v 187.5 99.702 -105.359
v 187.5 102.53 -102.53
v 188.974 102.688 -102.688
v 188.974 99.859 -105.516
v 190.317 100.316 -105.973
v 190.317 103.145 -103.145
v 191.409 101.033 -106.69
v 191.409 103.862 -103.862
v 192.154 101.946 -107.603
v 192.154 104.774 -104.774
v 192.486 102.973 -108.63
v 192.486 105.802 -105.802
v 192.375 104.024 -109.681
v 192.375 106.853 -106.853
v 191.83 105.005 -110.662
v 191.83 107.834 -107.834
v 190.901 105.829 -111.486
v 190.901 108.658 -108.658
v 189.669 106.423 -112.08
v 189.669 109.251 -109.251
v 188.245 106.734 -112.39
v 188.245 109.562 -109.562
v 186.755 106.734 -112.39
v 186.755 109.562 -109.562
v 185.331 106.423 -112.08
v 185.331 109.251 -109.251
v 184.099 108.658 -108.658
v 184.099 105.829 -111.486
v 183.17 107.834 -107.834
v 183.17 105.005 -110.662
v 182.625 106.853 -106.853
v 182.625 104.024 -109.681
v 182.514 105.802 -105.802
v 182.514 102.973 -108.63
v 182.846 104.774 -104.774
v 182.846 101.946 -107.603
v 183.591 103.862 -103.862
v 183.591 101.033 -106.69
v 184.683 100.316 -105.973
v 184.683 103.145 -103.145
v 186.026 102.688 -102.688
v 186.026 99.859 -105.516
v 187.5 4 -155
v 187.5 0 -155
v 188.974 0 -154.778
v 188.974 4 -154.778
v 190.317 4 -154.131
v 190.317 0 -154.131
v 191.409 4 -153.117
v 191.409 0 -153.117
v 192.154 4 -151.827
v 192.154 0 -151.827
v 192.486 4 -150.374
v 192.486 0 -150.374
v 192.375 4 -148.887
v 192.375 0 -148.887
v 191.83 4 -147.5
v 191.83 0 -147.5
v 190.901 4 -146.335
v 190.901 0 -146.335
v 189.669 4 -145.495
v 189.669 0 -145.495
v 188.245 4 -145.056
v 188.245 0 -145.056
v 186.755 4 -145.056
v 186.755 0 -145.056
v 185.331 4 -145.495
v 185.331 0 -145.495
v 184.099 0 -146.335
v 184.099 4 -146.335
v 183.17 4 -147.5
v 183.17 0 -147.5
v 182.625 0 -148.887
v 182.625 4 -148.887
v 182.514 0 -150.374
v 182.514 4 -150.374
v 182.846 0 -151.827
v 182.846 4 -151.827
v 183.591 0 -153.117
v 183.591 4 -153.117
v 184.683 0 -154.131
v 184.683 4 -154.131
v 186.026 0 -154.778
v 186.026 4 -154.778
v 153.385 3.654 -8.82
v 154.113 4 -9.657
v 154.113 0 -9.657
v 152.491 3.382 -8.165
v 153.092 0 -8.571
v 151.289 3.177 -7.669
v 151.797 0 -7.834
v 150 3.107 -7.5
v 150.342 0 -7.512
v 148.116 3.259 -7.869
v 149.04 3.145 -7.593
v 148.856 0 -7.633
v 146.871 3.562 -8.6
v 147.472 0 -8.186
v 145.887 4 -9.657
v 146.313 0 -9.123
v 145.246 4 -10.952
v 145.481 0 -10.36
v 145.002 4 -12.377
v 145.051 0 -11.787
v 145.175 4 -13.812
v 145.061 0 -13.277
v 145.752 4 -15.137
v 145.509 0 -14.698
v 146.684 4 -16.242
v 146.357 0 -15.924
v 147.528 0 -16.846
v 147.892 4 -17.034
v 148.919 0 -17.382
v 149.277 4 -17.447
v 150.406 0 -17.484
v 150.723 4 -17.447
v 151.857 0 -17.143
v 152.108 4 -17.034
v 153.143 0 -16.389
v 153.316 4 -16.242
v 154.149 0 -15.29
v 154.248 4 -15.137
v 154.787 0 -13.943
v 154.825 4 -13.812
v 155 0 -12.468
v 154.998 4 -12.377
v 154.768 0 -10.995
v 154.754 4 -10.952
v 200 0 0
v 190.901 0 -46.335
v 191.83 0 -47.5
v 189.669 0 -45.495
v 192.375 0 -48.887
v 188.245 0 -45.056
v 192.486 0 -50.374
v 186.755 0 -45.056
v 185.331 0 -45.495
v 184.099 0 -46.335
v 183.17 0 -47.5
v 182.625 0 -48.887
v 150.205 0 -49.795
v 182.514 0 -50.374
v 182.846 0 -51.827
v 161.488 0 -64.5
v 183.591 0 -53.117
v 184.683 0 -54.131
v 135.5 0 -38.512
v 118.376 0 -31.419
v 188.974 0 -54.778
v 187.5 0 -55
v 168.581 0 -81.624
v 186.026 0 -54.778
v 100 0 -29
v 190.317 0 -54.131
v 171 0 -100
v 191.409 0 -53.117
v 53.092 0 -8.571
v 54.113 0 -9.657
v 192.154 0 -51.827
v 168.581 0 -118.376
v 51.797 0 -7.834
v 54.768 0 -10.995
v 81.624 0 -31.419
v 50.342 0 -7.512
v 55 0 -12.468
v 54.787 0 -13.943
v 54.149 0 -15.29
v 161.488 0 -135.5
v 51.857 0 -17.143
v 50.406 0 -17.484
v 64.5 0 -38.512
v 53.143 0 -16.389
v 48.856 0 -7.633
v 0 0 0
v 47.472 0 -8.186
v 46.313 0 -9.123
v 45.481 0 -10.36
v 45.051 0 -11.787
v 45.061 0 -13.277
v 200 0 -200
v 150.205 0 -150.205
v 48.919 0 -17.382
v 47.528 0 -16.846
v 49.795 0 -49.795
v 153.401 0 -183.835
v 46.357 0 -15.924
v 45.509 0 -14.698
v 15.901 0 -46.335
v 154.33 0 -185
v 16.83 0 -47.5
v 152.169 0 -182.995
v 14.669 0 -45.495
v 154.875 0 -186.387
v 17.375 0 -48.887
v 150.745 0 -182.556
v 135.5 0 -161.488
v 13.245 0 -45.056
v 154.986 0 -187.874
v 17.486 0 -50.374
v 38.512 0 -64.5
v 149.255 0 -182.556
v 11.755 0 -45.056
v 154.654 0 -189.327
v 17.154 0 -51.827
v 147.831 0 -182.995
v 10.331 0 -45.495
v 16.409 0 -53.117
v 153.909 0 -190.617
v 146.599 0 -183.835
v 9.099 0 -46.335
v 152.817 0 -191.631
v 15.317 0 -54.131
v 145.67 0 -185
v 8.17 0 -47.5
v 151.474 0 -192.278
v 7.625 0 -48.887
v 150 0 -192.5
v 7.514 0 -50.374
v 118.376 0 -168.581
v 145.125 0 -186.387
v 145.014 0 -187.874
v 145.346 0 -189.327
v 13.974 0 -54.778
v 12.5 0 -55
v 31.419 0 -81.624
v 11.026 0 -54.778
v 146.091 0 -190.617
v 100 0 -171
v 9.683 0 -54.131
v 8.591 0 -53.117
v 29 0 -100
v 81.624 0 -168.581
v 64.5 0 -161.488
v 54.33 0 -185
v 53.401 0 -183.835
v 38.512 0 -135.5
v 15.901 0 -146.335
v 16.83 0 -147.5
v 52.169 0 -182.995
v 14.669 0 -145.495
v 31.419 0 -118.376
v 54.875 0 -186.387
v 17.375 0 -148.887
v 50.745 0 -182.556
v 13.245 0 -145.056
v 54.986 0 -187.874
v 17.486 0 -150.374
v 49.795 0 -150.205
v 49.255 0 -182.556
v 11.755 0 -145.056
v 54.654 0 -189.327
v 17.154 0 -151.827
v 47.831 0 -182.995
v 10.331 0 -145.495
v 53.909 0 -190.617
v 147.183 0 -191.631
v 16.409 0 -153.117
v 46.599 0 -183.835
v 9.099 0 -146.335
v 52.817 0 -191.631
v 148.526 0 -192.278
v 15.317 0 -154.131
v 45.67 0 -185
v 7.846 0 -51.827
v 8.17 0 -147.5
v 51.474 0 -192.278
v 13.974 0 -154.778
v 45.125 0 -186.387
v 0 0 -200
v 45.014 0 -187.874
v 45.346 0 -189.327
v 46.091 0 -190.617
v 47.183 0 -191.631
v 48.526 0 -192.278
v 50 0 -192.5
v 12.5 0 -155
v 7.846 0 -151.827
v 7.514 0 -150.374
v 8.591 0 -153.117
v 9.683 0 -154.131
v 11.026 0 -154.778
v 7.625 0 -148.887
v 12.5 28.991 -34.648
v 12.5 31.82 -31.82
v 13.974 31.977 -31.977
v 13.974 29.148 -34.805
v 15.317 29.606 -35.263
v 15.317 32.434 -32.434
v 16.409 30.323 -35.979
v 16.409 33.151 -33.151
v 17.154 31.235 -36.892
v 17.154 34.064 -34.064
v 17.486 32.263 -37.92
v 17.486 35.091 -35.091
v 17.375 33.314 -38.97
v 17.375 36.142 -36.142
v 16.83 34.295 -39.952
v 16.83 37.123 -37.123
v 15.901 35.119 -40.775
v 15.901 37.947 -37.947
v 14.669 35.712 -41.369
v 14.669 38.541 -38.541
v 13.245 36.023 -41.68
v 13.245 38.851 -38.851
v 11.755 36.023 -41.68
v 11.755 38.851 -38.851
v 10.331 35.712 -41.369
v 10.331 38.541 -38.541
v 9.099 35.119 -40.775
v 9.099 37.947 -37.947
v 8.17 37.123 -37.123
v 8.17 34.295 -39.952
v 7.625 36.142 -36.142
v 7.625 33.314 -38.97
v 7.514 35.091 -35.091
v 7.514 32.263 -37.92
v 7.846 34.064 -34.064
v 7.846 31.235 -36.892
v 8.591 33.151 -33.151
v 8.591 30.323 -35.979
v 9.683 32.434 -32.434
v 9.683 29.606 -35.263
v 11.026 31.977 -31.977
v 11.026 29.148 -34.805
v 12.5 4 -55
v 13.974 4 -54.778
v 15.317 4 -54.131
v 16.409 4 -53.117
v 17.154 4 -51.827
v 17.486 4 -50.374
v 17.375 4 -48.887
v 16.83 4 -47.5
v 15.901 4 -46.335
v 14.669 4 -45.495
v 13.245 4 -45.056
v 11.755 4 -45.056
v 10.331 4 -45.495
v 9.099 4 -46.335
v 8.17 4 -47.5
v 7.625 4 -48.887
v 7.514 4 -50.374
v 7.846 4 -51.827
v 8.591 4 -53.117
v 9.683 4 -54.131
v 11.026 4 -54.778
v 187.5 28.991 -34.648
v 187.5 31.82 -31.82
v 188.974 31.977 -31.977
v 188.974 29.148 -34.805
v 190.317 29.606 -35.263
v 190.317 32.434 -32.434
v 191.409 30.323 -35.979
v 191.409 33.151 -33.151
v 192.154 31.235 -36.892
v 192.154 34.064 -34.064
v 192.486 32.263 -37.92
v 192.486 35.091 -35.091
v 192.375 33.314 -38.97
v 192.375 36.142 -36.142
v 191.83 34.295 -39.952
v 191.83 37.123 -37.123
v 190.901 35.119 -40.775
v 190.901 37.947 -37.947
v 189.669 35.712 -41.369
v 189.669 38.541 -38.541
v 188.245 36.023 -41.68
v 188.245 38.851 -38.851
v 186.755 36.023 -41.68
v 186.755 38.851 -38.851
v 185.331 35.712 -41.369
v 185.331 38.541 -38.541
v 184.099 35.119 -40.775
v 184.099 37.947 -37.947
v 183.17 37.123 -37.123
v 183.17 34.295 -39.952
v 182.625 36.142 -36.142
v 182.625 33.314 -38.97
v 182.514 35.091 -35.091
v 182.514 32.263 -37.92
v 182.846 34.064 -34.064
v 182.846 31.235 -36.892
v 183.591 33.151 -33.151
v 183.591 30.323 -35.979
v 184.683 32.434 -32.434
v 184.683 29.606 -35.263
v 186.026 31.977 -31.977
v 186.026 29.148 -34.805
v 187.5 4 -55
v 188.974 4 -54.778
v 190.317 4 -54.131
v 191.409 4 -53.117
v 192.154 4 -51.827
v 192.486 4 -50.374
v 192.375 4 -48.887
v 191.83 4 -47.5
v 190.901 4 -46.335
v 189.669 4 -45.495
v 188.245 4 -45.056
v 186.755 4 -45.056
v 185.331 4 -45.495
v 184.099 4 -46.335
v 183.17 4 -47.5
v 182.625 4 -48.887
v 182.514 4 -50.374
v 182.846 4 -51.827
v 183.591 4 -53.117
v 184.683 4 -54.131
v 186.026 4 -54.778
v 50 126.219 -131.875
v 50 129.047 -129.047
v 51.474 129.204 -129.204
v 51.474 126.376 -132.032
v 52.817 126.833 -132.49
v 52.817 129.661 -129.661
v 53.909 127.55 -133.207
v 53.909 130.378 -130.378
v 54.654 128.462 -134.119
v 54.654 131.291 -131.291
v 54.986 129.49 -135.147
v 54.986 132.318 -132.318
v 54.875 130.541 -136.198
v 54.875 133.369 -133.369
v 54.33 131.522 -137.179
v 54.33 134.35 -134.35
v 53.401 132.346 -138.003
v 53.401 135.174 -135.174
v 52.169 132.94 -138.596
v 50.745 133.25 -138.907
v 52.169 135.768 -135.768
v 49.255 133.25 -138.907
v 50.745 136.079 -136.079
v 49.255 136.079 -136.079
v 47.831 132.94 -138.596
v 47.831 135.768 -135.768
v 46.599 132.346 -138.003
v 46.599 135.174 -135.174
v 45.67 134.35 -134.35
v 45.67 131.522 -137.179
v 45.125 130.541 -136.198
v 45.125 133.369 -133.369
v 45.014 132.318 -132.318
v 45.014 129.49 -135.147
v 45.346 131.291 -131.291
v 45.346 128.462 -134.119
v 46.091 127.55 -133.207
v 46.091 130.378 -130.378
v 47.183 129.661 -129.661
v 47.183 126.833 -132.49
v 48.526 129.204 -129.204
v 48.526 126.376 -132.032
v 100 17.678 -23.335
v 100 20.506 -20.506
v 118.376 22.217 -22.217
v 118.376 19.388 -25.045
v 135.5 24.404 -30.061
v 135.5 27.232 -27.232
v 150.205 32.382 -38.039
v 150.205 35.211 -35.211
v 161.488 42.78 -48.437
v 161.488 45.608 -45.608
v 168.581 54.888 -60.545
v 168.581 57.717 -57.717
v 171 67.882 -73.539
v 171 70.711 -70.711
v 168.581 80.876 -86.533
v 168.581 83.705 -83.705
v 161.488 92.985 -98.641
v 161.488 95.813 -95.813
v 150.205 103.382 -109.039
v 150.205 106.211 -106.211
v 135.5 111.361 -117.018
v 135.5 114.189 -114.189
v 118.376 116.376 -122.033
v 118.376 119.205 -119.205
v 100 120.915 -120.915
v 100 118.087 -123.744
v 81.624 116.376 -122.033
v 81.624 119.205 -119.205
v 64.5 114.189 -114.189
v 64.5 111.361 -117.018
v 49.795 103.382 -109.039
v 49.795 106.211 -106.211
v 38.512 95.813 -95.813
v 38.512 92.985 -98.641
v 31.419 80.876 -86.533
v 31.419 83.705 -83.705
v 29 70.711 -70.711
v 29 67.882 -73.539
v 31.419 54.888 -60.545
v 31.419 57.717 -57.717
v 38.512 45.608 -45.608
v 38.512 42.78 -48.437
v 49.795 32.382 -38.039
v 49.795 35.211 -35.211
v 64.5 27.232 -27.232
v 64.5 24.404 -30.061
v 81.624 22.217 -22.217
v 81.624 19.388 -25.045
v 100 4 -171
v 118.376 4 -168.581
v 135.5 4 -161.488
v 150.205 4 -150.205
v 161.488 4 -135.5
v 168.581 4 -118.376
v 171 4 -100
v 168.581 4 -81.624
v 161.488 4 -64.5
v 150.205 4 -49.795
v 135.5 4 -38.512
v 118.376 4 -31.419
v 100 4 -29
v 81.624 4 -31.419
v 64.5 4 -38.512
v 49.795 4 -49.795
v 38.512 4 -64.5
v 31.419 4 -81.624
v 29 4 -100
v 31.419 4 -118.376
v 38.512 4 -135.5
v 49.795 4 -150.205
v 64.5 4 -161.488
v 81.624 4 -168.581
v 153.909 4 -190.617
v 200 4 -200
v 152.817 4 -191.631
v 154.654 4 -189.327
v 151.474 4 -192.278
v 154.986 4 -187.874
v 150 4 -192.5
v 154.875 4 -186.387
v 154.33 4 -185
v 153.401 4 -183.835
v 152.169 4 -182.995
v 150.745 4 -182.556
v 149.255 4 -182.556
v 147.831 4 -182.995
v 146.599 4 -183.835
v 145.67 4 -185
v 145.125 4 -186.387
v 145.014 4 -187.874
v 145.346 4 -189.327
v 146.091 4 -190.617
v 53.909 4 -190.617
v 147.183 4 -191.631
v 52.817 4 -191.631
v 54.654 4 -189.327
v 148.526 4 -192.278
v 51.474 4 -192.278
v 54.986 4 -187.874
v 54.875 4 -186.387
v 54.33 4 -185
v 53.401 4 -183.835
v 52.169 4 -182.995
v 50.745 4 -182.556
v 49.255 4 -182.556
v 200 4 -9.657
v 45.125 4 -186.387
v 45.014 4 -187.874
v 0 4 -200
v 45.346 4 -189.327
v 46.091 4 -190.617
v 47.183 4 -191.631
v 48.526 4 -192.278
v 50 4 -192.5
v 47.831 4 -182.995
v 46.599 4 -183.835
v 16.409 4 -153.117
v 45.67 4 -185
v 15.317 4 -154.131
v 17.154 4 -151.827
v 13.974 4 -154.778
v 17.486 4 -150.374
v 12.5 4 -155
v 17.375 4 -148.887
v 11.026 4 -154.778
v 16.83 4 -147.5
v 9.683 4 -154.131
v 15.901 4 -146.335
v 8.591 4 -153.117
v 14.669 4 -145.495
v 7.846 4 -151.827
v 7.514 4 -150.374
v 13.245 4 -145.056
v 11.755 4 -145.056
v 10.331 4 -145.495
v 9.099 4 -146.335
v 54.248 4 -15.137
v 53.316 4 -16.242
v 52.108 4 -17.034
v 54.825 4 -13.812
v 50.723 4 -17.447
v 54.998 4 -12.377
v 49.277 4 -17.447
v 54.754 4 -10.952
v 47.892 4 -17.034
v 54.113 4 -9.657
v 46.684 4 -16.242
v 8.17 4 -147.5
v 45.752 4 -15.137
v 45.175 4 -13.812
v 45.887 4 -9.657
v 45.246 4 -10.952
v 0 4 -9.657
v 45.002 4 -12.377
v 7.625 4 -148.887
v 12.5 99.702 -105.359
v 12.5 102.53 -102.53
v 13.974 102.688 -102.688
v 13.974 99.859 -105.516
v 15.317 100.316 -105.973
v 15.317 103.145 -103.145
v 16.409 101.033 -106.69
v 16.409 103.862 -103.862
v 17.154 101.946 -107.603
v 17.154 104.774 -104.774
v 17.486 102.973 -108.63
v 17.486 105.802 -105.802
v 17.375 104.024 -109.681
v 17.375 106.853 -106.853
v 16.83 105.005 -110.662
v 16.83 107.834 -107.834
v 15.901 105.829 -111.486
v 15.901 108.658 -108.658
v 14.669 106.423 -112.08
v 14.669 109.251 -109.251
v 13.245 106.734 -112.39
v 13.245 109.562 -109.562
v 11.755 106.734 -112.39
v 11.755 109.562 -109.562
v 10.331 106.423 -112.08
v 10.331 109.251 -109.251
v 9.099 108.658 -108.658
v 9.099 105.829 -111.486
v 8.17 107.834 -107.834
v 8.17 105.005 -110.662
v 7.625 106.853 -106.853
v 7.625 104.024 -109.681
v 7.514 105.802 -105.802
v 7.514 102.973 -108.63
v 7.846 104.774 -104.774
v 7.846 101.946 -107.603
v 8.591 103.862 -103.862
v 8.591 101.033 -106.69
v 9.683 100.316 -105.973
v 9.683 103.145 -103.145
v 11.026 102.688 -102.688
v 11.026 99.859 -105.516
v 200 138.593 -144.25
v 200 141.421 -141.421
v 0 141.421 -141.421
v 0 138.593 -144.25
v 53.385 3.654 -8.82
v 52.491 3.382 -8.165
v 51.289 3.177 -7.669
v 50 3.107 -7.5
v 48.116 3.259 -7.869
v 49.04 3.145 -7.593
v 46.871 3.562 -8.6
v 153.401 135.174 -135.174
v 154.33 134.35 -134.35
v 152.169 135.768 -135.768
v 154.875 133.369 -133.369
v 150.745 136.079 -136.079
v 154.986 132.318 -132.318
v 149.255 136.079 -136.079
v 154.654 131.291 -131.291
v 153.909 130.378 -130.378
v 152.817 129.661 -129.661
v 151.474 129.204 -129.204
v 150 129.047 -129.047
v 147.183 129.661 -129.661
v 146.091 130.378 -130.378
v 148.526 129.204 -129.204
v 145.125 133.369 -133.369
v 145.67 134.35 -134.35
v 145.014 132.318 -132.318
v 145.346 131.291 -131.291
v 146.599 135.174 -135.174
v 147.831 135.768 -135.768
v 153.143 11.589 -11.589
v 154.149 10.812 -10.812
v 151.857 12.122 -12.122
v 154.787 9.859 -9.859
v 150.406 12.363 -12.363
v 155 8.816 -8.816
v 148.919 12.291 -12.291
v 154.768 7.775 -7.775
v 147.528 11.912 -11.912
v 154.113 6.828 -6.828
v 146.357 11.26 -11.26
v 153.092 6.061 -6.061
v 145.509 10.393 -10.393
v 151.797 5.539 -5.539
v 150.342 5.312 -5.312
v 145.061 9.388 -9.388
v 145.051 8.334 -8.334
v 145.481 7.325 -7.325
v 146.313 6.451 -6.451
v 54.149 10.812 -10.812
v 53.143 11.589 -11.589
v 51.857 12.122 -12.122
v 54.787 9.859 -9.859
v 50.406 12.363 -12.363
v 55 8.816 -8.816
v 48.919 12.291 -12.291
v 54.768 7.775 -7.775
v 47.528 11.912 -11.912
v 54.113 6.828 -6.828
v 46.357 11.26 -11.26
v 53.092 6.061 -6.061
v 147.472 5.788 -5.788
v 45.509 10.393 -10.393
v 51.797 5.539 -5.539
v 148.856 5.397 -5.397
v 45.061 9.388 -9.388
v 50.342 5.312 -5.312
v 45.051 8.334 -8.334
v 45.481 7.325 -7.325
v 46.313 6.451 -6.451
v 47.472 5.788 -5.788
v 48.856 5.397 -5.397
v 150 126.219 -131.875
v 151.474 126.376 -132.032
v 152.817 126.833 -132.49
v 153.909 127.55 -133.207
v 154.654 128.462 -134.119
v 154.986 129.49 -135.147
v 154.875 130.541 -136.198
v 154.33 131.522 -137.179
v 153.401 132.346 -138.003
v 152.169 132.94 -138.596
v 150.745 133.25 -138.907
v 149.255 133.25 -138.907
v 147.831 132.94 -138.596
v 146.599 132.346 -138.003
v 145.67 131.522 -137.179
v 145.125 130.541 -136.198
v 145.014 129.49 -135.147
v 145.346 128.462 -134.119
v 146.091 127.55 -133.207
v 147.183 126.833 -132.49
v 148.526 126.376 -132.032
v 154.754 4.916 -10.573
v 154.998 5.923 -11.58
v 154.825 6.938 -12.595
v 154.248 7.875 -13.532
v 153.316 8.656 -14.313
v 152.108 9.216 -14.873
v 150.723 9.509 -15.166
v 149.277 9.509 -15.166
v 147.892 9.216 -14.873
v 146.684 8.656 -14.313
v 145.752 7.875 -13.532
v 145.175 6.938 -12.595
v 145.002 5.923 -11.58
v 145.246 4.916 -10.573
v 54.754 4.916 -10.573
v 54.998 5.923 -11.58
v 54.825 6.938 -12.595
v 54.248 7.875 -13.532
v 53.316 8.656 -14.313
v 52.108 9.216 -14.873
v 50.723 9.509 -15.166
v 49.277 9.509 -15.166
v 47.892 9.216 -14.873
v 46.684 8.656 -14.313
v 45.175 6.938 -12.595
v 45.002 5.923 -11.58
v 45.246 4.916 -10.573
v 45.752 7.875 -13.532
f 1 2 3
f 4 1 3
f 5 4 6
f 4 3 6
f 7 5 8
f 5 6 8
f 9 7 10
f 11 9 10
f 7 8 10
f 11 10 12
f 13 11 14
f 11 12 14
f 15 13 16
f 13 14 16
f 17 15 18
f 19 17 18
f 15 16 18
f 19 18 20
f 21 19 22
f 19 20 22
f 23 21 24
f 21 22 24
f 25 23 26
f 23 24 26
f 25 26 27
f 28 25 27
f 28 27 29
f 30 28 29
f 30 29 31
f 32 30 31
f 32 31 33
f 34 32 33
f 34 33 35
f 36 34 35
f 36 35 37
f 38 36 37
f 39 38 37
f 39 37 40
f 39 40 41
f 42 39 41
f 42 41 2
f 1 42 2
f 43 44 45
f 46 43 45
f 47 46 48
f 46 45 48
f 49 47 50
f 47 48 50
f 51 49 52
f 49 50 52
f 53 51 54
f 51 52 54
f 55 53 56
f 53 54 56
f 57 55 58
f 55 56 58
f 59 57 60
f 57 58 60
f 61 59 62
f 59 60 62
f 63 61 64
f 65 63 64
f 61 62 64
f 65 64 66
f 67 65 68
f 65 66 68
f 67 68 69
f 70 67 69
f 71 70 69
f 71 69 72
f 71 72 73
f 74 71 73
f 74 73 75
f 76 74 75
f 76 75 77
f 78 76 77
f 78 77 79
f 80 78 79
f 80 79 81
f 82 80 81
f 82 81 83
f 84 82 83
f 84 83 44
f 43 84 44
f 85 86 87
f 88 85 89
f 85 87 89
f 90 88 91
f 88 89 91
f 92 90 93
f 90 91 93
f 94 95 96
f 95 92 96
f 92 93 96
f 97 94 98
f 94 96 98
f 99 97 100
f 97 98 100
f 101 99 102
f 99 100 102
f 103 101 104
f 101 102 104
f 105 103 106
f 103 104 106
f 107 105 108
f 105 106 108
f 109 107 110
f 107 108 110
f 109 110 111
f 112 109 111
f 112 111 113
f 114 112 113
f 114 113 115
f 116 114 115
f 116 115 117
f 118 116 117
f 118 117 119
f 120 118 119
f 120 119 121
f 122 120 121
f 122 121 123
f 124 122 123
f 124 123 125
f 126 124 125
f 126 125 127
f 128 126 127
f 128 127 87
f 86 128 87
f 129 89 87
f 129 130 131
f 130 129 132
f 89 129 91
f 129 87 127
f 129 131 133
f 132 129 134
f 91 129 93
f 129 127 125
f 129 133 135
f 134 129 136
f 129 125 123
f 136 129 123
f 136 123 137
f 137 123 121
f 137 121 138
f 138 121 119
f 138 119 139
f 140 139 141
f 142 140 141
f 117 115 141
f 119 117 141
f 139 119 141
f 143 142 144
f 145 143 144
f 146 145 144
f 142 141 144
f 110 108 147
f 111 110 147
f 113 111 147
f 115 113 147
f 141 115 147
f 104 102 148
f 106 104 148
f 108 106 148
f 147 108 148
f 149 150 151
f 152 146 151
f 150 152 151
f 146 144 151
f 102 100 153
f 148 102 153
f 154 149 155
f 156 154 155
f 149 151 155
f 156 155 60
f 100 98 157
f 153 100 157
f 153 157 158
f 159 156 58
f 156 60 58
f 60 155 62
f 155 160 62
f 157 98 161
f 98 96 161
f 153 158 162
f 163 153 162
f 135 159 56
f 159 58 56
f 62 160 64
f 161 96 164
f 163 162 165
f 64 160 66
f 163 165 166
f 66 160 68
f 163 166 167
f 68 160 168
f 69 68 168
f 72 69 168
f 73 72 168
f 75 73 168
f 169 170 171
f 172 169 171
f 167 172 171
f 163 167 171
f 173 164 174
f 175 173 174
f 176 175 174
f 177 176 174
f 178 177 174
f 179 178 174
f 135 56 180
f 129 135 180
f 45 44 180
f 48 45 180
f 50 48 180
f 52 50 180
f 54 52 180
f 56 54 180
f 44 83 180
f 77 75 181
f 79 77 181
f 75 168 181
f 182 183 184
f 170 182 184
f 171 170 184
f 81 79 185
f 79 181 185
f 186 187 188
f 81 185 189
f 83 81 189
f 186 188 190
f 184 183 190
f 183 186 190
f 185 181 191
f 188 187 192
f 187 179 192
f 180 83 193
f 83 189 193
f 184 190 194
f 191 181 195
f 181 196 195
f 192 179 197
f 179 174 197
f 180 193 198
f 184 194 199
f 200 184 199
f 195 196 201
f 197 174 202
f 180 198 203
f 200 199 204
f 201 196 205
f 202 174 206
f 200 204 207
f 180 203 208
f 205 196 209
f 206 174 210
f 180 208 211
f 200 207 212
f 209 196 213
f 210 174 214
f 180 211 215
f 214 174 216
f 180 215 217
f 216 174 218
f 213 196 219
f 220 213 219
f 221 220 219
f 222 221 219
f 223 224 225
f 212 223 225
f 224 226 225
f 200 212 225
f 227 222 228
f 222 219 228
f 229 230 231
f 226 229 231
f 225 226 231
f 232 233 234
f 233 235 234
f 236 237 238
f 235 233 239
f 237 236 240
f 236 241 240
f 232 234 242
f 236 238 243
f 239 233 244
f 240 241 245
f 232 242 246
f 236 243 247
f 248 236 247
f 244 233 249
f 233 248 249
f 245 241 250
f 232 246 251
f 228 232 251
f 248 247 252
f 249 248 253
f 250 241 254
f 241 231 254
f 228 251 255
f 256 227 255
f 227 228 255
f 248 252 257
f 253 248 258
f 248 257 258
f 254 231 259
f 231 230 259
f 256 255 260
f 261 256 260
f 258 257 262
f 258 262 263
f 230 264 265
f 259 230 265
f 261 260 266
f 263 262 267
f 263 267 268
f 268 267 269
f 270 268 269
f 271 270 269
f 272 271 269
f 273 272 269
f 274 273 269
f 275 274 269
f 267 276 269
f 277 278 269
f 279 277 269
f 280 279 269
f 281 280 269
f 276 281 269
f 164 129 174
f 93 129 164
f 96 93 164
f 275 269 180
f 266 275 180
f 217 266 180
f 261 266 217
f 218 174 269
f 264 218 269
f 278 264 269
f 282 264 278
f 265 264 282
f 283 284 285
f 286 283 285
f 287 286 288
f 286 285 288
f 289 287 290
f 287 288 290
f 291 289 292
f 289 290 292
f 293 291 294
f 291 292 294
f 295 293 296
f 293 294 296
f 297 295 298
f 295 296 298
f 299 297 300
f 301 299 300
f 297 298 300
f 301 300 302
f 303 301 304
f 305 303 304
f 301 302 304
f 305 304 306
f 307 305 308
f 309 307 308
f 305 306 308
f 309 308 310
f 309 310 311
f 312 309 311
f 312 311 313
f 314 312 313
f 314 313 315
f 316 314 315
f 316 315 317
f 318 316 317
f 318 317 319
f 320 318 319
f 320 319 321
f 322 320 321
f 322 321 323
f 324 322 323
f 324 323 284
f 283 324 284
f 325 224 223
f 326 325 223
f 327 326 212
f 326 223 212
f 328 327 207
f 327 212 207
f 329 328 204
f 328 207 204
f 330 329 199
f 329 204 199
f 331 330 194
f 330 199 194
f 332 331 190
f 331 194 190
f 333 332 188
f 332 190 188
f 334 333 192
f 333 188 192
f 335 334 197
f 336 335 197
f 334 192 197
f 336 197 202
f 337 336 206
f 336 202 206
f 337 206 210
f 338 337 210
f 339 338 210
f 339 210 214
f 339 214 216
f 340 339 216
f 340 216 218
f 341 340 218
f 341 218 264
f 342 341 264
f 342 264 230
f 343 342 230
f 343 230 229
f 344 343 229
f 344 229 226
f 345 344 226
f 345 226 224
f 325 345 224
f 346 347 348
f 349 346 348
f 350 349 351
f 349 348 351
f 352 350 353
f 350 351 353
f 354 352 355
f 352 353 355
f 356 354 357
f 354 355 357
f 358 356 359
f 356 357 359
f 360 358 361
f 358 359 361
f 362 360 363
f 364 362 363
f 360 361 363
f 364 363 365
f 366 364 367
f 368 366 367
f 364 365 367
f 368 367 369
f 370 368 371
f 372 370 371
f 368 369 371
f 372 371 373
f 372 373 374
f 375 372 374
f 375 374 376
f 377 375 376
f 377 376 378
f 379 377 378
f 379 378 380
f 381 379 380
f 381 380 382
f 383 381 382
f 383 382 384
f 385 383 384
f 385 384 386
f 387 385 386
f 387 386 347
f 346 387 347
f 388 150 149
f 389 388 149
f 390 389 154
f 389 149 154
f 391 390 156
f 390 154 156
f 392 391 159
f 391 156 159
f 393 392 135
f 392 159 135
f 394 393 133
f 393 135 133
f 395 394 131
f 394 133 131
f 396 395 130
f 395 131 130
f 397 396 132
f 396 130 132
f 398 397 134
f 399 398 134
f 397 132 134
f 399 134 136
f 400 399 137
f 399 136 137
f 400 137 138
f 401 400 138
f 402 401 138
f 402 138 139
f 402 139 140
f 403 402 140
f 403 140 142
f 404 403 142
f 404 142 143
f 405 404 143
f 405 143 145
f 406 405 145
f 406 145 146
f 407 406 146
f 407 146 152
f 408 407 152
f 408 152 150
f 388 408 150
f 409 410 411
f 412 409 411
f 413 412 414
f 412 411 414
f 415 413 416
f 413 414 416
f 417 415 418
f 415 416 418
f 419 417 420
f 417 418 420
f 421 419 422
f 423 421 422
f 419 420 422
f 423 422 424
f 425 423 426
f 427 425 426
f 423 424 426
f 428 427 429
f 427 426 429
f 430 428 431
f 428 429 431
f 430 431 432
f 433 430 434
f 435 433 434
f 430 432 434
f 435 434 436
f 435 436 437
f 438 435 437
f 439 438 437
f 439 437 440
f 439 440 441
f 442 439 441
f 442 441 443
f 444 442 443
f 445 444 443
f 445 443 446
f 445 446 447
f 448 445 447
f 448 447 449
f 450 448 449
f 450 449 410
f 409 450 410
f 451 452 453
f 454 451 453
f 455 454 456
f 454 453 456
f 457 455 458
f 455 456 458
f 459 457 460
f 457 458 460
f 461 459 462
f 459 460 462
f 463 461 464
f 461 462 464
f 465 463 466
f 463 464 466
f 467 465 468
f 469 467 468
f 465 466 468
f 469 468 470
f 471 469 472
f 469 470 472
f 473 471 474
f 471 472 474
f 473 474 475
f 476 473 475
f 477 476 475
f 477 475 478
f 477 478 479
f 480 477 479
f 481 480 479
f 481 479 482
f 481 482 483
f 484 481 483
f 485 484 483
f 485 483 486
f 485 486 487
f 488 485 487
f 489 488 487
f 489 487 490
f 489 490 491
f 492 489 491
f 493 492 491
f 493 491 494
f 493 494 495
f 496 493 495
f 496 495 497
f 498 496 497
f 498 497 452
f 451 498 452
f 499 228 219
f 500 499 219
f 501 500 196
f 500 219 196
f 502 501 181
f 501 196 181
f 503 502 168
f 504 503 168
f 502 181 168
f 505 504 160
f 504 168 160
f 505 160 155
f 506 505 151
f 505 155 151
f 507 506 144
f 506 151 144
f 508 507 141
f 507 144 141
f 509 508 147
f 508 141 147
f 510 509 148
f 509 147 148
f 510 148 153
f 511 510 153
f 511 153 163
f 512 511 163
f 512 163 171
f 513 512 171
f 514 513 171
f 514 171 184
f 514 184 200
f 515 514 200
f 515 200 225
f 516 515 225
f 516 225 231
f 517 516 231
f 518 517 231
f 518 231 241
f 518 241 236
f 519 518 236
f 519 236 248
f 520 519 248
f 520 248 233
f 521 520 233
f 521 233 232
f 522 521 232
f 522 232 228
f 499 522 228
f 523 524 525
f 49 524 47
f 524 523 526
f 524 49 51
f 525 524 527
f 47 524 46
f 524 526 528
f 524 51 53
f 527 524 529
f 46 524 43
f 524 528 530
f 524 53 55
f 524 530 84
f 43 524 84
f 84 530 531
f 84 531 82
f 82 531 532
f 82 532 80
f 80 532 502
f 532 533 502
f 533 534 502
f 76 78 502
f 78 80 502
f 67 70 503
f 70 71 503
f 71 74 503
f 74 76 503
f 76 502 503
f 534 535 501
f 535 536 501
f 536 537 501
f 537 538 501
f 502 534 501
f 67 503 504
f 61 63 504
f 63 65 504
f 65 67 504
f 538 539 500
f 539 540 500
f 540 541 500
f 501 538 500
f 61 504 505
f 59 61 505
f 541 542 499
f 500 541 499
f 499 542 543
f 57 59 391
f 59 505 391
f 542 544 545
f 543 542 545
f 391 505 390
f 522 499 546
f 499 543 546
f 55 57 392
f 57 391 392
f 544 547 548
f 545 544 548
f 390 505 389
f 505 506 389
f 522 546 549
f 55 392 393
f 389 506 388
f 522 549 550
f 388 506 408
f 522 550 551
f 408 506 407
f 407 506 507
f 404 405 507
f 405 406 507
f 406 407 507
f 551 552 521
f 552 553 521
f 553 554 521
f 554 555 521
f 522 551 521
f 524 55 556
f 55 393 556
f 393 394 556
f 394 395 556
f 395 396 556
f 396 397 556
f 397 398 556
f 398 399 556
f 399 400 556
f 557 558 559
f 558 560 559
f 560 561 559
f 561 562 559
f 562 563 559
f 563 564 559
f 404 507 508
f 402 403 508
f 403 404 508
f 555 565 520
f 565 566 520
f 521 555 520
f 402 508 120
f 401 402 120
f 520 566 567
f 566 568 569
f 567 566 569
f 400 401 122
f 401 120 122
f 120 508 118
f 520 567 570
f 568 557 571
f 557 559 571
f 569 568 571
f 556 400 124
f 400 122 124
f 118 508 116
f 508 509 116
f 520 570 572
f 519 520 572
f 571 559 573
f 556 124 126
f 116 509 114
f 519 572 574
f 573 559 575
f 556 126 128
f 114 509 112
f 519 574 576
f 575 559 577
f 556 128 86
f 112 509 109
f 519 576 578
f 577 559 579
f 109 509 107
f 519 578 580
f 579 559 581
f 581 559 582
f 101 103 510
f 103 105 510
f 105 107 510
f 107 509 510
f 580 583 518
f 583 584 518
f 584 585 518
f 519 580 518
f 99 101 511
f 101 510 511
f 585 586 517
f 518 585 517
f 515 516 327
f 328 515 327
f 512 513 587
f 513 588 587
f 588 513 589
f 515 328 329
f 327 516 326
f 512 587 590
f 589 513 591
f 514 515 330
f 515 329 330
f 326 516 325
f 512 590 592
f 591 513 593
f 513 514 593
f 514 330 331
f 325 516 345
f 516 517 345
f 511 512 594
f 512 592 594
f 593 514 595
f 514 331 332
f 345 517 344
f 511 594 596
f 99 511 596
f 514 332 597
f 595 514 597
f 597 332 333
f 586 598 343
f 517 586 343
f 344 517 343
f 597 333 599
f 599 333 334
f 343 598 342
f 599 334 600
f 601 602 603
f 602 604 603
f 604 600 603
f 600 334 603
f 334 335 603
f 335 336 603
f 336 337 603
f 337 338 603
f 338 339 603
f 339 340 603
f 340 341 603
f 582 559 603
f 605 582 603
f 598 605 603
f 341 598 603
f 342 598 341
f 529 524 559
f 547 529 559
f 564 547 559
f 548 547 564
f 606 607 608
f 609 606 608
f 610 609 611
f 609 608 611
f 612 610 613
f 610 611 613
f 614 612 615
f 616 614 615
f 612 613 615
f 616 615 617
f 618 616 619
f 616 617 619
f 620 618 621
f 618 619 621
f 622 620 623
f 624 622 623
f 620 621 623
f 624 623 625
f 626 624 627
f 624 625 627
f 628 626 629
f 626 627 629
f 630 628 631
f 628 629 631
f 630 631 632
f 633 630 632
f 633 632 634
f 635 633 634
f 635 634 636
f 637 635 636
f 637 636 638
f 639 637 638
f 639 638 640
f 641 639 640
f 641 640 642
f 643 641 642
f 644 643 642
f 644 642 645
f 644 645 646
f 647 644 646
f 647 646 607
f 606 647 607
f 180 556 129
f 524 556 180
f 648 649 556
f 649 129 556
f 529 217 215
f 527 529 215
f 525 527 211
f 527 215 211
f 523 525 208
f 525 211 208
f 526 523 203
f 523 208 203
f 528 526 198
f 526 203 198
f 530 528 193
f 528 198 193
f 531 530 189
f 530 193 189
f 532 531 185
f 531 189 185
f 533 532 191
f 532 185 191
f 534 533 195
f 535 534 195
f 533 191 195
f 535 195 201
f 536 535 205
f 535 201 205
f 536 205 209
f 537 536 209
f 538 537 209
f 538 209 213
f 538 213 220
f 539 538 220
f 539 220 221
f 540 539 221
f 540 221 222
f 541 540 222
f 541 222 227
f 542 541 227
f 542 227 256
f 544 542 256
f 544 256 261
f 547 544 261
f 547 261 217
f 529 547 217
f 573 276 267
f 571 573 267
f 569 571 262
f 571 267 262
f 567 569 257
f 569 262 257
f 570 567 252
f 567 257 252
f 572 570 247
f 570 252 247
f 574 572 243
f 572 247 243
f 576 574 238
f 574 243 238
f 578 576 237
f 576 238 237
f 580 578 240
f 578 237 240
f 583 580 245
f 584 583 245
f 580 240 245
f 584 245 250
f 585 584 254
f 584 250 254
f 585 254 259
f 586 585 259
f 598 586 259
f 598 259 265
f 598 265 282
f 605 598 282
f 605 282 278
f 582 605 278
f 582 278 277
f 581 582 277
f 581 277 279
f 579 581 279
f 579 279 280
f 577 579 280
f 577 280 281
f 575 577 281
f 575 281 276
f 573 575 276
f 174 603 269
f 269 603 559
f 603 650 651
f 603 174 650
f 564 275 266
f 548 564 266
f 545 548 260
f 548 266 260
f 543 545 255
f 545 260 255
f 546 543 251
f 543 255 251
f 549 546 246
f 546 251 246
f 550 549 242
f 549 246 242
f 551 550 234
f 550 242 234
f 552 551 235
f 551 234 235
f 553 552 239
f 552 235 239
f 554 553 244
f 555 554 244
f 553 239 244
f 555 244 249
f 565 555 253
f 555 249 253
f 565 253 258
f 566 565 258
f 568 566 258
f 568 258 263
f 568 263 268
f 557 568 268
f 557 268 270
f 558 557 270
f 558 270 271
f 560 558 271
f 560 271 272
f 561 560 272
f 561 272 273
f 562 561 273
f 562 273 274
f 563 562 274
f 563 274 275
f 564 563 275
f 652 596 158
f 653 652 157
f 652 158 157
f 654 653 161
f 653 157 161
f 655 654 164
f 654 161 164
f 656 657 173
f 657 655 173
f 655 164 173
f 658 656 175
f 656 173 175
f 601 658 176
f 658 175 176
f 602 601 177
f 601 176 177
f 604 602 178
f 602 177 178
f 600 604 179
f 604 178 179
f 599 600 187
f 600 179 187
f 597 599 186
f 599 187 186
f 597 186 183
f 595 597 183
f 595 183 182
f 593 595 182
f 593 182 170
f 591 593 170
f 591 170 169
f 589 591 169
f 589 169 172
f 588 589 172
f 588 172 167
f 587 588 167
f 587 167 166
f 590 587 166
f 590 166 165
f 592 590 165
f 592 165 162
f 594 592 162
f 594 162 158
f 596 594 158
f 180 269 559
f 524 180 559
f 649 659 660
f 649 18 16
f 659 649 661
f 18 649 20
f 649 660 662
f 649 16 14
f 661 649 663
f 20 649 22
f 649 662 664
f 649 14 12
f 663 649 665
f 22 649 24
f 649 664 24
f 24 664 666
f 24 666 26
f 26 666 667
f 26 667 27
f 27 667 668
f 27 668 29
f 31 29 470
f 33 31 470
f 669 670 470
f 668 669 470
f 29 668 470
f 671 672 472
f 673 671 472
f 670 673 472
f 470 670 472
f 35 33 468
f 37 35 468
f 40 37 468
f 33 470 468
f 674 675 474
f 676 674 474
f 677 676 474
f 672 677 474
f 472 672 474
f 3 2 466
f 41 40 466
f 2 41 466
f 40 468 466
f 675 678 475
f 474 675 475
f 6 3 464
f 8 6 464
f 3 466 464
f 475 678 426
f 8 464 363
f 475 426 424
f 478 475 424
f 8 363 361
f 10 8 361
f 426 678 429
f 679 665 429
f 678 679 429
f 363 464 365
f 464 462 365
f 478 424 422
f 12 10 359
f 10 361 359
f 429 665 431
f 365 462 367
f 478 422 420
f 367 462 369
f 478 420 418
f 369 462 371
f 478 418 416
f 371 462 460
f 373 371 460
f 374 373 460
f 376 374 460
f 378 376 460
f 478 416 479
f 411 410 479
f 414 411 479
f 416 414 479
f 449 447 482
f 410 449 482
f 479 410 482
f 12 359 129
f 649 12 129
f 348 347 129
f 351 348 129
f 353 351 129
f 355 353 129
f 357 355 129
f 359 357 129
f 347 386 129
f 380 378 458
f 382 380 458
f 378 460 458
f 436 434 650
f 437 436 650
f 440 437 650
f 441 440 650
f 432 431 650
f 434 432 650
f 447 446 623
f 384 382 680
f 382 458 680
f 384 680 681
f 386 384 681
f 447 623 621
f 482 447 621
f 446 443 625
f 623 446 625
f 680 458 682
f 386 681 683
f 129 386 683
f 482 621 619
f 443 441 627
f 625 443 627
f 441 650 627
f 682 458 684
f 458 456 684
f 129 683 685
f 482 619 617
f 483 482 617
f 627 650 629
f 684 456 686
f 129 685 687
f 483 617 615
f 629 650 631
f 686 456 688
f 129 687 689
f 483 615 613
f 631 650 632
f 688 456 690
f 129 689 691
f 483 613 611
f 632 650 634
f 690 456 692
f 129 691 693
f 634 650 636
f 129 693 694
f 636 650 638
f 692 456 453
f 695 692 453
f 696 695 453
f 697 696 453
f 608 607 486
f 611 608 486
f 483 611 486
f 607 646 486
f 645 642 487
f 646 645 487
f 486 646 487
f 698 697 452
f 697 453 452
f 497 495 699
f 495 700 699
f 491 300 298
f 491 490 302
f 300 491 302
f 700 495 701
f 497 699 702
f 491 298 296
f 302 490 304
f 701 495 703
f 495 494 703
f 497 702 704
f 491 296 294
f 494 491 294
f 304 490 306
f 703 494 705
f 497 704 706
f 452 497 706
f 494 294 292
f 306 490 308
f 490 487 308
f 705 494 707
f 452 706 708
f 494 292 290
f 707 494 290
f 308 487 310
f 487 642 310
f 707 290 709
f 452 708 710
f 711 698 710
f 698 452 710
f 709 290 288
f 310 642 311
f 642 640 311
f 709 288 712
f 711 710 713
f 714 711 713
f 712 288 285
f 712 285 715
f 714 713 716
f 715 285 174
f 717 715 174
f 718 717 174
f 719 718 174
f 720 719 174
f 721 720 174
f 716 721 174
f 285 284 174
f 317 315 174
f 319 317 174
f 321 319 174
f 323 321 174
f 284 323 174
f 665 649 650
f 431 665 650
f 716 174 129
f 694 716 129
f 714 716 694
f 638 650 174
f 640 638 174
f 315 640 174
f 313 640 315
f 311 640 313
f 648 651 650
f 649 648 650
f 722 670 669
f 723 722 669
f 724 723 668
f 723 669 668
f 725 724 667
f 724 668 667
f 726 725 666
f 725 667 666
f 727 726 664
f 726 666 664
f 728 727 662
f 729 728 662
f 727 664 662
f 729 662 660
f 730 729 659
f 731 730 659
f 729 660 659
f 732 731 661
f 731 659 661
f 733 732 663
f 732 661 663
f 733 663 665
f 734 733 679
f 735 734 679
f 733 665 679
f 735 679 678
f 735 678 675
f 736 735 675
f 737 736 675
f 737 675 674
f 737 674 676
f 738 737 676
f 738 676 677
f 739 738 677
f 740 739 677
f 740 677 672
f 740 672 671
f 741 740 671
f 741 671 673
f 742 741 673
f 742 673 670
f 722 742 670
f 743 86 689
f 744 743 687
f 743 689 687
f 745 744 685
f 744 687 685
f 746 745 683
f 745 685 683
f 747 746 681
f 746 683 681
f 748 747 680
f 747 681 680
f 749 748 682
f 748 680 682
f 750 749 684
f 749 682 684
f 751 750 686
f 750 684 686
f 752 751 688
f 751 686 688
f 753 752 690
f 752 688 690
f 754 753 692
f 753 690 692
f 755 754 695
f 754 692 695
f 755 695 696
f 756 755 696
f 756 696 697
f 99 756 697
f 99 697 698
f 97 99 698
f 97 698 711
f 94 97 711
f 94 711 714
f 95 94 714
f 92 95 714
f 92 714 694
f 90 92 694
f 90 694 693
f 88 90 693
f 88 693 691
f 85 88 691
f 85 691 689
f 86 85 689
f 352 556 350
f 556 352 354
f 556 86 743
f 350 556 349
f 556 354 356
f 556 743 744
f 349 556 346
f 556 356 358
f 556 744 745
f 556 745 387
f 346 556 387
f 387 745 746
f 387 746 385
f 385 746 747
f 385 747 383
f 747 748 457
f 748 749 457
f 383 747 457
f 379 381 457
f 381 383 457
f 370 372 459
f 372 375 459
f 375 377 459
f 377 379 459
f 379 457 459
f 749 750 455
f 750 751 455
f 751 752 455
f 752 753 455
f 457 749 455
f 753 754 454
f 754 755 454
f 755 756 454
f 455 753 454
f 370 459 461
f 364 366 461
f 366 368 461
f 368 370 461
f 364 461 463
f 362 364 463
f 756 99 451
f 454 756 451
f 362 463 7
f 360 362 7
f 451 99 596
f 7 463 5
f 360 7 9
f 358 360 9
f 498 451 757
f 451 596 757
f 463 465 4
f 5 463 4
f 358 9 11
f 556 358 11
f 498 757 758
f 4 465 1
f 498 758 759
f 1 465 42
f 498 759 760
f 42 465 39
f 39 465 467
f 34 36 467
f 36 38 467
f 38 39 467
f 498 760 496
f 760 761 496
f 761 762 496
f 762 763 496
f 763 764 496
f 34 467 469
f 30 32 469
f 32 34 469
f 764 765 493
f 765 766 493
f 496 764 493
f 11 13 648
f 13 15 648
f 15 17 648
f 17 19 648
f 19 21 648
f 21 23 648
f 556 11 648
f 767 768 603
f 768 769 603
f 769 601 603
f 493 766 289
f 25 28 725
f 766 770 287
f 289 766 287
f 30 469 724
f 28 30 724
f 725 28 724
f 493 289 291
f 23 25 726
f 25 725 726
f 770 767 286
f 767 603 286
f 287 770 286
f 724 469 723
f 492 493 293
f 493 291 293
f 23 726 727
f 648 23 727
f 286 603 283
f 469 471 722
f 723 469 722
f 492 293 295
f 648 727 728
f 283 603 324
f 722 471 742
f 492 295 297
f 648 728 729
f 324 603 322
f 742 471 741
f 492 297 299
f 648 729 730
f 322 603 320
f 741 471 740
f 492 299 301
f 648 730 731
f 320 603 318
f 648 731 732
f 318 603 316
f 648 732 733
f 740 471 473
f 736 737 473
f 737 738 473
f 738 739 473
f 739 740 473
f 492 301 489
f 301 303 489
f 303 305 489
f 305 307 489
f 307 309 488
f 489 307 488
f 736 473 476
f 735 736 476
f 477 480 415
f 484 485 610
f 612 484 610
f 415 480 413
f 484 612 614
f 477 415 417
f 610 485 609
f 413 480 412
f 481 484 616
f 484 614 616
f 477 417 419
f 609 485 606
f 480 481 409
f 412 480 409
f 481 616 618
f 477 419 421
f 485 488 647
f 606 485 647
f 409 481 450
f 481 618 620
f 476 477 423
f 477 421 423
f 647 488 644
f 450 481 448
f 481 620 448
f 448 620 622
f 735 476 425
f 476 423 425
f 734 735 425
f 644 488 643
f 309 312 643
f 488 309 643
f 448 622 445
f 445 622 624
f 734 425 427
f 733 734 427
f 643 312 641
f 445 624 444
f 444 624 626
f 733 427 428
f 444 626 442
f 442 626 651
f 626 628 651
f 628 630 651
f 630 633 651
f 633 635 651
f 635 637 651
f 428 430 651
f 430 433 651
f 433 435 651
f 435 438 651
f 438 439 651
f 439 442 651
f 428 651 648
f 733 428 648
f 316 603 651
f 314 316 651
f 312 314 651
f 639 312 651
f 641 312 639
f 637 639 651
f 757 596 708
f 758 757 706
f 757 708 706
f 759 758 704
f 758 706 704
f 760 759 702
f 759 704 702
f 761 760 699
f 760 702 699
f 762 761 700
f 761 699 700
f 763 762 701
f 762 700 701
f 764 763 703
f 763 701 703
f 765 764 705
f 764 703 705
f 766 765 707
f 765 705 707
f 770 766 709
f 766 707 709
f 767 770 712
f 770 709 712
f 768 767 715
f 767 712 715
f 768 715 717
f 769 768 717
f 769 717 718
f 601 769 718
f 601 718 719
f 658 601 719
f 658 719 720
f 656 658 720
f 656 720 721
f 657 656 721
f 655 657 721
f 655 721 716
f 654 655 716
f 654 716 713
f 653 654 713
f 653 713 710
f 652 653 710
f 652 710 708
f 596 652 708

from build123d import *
from build123d.topology import SkipClean

# Parameters (mm, degrees)
EXTRUDE_1_DEPTH     = 200
SKETCH_4_R          = 5
CUT_EXTRUDE_3_DEPTH = 5
SKETCH_5_R          = 5
CUT_EXTRUDE_4_DEPTH = 5
SKETCH_6_R          = 71
CUT_EXTRUDE_5_DEPTH = 10
SKETCH_7_R          = 71
CUT_EXTRUDE_6_DEPTH = 10


with BuildPart() as part:
    # 草图1 → 凸台-拉伸1 (new body)
    with BuildSketch(Plane(origin=(0, 0, 0), x_dir=(0, 0, -1), z_dir=(1, 0, 0))):
        Polygon((141.421356237, 141.421356237), (0, 0), (200, 0), (200, 4), (9.656854249, 4), (144.249783362, 138.592929113), align=None)
    extrude(amount=EXTRUDE_1_DEPTH)

    # 草图4 → 切除-拉伸3 (cut)
    with SkipClean():  # the faces are left unmerged after this step: merging them gives an invalid solid
        with BuildSketch(Plane(origin=(0, 0, 0), x_dir=(1, 0, 0), z_dir=(0, 0.7071067811865512, 0.7071067811865438))):
            with Locations(Location((12.5, 150, 0), (0, 0, 270))):
                Circle(SKETCH_4_R)
            with Locations(Location((12.5, 50, 0), (0, 0, 270))):
                Circle(SKETCH_4_R)
            with Locations(Location((50, 187.5, 0), (0, 0, 270))):
                Circle(SKETCH_4_R)
            with Locations(Location((150, 187.5, 0), (0, 0, 270))):
                Circle(SKETCH_4_R)
            with Locations(Location((187.5, 50, 0), (0, 0, 270))):
                Circle(SKETCH_4_R)
            with Locations(Location((187.5, 150, 0), (0, 0, 270))):
                Circle(SKETCH_4_R)
            with Locations(Location((150, 12.5, 0), (0, 0, 325.345312559))):
                Circle(SKETCH_4_R)
            with Locations(Location((50, 12.5, 0), (0, 0, 325.345312559))):
                Circle(SKETCH_4_R)
        extrude(amount=-CUT_EXTRUDE_3_DEPTH, mode=Mode.SUBTRACT)

    # 草图5 → 切除-拉伸4 (cut)
    with BuildSketch(Plane.XZ):
        with Locations(Location((12.5, -50, 0), (0, 0, 270))):
            Circle(SKETCH_5_R)
        with Locations(Location((12.5, -150, 0), (0, 0, 270))):
            Circle(SKETCH_5_R)
        with Locations(Location((50, -187.5, 0), (0, 0, 270))):
            Circle(SKETCH_5_R)
        with Locations(Location((150, -187.5, 0), (0, 0, 270))):
            Circle(SKETCH_5_R)
        with Locations(Location((150, -12.5, 0), (0, 0, 34.654687441))):
            Circle(SKETCH_5_R)
        with Locations(Location((50, -12.5, 0), (0, 0, 34.654687441))):
            Circle(SKETCH_5_R)
        with Locations(Location((187.5, -150, 0), (0, 0, 270))):
            Circle(SKETCH_5_R)
        with Locations(Location((187.5, -50, 0), (0, 0, 270))):
            Circle(SKETCH_5_R)
    extrude(amount=-CUT_EXTRUDE_4_DEPTH, mode=Mode.SUBTRACT)

    # 草图6 → 切除-拉伸5 (cut)
    with BuildSketch(Plane(origin=(0, 0, 0), x_dir=(1, 0, 0), z_dir=(0, 0.7071067811865512, 0.7071067811865439))):
        with Locations(Location((100, 100, 0), (0, 0, 270))):
            Circle(SKETCH_6_R)
    extrude(amount=-CUT_EXTRUDE_5_DEPTH, mode=Mode.SUBTRACT)

    # 草图7 → 切除-拉伸6 (cut)
    with BuildSketch(Plane.XZ):
        with Locations(Location((100, -100, 0), (0, 0, 270))):
            Circle(SKETCH_7_R)
    extrude(amount=-CUT_EXTRUDE_6_DEPTH, mode=Mode.SUBTRACT)


solid = part.part
